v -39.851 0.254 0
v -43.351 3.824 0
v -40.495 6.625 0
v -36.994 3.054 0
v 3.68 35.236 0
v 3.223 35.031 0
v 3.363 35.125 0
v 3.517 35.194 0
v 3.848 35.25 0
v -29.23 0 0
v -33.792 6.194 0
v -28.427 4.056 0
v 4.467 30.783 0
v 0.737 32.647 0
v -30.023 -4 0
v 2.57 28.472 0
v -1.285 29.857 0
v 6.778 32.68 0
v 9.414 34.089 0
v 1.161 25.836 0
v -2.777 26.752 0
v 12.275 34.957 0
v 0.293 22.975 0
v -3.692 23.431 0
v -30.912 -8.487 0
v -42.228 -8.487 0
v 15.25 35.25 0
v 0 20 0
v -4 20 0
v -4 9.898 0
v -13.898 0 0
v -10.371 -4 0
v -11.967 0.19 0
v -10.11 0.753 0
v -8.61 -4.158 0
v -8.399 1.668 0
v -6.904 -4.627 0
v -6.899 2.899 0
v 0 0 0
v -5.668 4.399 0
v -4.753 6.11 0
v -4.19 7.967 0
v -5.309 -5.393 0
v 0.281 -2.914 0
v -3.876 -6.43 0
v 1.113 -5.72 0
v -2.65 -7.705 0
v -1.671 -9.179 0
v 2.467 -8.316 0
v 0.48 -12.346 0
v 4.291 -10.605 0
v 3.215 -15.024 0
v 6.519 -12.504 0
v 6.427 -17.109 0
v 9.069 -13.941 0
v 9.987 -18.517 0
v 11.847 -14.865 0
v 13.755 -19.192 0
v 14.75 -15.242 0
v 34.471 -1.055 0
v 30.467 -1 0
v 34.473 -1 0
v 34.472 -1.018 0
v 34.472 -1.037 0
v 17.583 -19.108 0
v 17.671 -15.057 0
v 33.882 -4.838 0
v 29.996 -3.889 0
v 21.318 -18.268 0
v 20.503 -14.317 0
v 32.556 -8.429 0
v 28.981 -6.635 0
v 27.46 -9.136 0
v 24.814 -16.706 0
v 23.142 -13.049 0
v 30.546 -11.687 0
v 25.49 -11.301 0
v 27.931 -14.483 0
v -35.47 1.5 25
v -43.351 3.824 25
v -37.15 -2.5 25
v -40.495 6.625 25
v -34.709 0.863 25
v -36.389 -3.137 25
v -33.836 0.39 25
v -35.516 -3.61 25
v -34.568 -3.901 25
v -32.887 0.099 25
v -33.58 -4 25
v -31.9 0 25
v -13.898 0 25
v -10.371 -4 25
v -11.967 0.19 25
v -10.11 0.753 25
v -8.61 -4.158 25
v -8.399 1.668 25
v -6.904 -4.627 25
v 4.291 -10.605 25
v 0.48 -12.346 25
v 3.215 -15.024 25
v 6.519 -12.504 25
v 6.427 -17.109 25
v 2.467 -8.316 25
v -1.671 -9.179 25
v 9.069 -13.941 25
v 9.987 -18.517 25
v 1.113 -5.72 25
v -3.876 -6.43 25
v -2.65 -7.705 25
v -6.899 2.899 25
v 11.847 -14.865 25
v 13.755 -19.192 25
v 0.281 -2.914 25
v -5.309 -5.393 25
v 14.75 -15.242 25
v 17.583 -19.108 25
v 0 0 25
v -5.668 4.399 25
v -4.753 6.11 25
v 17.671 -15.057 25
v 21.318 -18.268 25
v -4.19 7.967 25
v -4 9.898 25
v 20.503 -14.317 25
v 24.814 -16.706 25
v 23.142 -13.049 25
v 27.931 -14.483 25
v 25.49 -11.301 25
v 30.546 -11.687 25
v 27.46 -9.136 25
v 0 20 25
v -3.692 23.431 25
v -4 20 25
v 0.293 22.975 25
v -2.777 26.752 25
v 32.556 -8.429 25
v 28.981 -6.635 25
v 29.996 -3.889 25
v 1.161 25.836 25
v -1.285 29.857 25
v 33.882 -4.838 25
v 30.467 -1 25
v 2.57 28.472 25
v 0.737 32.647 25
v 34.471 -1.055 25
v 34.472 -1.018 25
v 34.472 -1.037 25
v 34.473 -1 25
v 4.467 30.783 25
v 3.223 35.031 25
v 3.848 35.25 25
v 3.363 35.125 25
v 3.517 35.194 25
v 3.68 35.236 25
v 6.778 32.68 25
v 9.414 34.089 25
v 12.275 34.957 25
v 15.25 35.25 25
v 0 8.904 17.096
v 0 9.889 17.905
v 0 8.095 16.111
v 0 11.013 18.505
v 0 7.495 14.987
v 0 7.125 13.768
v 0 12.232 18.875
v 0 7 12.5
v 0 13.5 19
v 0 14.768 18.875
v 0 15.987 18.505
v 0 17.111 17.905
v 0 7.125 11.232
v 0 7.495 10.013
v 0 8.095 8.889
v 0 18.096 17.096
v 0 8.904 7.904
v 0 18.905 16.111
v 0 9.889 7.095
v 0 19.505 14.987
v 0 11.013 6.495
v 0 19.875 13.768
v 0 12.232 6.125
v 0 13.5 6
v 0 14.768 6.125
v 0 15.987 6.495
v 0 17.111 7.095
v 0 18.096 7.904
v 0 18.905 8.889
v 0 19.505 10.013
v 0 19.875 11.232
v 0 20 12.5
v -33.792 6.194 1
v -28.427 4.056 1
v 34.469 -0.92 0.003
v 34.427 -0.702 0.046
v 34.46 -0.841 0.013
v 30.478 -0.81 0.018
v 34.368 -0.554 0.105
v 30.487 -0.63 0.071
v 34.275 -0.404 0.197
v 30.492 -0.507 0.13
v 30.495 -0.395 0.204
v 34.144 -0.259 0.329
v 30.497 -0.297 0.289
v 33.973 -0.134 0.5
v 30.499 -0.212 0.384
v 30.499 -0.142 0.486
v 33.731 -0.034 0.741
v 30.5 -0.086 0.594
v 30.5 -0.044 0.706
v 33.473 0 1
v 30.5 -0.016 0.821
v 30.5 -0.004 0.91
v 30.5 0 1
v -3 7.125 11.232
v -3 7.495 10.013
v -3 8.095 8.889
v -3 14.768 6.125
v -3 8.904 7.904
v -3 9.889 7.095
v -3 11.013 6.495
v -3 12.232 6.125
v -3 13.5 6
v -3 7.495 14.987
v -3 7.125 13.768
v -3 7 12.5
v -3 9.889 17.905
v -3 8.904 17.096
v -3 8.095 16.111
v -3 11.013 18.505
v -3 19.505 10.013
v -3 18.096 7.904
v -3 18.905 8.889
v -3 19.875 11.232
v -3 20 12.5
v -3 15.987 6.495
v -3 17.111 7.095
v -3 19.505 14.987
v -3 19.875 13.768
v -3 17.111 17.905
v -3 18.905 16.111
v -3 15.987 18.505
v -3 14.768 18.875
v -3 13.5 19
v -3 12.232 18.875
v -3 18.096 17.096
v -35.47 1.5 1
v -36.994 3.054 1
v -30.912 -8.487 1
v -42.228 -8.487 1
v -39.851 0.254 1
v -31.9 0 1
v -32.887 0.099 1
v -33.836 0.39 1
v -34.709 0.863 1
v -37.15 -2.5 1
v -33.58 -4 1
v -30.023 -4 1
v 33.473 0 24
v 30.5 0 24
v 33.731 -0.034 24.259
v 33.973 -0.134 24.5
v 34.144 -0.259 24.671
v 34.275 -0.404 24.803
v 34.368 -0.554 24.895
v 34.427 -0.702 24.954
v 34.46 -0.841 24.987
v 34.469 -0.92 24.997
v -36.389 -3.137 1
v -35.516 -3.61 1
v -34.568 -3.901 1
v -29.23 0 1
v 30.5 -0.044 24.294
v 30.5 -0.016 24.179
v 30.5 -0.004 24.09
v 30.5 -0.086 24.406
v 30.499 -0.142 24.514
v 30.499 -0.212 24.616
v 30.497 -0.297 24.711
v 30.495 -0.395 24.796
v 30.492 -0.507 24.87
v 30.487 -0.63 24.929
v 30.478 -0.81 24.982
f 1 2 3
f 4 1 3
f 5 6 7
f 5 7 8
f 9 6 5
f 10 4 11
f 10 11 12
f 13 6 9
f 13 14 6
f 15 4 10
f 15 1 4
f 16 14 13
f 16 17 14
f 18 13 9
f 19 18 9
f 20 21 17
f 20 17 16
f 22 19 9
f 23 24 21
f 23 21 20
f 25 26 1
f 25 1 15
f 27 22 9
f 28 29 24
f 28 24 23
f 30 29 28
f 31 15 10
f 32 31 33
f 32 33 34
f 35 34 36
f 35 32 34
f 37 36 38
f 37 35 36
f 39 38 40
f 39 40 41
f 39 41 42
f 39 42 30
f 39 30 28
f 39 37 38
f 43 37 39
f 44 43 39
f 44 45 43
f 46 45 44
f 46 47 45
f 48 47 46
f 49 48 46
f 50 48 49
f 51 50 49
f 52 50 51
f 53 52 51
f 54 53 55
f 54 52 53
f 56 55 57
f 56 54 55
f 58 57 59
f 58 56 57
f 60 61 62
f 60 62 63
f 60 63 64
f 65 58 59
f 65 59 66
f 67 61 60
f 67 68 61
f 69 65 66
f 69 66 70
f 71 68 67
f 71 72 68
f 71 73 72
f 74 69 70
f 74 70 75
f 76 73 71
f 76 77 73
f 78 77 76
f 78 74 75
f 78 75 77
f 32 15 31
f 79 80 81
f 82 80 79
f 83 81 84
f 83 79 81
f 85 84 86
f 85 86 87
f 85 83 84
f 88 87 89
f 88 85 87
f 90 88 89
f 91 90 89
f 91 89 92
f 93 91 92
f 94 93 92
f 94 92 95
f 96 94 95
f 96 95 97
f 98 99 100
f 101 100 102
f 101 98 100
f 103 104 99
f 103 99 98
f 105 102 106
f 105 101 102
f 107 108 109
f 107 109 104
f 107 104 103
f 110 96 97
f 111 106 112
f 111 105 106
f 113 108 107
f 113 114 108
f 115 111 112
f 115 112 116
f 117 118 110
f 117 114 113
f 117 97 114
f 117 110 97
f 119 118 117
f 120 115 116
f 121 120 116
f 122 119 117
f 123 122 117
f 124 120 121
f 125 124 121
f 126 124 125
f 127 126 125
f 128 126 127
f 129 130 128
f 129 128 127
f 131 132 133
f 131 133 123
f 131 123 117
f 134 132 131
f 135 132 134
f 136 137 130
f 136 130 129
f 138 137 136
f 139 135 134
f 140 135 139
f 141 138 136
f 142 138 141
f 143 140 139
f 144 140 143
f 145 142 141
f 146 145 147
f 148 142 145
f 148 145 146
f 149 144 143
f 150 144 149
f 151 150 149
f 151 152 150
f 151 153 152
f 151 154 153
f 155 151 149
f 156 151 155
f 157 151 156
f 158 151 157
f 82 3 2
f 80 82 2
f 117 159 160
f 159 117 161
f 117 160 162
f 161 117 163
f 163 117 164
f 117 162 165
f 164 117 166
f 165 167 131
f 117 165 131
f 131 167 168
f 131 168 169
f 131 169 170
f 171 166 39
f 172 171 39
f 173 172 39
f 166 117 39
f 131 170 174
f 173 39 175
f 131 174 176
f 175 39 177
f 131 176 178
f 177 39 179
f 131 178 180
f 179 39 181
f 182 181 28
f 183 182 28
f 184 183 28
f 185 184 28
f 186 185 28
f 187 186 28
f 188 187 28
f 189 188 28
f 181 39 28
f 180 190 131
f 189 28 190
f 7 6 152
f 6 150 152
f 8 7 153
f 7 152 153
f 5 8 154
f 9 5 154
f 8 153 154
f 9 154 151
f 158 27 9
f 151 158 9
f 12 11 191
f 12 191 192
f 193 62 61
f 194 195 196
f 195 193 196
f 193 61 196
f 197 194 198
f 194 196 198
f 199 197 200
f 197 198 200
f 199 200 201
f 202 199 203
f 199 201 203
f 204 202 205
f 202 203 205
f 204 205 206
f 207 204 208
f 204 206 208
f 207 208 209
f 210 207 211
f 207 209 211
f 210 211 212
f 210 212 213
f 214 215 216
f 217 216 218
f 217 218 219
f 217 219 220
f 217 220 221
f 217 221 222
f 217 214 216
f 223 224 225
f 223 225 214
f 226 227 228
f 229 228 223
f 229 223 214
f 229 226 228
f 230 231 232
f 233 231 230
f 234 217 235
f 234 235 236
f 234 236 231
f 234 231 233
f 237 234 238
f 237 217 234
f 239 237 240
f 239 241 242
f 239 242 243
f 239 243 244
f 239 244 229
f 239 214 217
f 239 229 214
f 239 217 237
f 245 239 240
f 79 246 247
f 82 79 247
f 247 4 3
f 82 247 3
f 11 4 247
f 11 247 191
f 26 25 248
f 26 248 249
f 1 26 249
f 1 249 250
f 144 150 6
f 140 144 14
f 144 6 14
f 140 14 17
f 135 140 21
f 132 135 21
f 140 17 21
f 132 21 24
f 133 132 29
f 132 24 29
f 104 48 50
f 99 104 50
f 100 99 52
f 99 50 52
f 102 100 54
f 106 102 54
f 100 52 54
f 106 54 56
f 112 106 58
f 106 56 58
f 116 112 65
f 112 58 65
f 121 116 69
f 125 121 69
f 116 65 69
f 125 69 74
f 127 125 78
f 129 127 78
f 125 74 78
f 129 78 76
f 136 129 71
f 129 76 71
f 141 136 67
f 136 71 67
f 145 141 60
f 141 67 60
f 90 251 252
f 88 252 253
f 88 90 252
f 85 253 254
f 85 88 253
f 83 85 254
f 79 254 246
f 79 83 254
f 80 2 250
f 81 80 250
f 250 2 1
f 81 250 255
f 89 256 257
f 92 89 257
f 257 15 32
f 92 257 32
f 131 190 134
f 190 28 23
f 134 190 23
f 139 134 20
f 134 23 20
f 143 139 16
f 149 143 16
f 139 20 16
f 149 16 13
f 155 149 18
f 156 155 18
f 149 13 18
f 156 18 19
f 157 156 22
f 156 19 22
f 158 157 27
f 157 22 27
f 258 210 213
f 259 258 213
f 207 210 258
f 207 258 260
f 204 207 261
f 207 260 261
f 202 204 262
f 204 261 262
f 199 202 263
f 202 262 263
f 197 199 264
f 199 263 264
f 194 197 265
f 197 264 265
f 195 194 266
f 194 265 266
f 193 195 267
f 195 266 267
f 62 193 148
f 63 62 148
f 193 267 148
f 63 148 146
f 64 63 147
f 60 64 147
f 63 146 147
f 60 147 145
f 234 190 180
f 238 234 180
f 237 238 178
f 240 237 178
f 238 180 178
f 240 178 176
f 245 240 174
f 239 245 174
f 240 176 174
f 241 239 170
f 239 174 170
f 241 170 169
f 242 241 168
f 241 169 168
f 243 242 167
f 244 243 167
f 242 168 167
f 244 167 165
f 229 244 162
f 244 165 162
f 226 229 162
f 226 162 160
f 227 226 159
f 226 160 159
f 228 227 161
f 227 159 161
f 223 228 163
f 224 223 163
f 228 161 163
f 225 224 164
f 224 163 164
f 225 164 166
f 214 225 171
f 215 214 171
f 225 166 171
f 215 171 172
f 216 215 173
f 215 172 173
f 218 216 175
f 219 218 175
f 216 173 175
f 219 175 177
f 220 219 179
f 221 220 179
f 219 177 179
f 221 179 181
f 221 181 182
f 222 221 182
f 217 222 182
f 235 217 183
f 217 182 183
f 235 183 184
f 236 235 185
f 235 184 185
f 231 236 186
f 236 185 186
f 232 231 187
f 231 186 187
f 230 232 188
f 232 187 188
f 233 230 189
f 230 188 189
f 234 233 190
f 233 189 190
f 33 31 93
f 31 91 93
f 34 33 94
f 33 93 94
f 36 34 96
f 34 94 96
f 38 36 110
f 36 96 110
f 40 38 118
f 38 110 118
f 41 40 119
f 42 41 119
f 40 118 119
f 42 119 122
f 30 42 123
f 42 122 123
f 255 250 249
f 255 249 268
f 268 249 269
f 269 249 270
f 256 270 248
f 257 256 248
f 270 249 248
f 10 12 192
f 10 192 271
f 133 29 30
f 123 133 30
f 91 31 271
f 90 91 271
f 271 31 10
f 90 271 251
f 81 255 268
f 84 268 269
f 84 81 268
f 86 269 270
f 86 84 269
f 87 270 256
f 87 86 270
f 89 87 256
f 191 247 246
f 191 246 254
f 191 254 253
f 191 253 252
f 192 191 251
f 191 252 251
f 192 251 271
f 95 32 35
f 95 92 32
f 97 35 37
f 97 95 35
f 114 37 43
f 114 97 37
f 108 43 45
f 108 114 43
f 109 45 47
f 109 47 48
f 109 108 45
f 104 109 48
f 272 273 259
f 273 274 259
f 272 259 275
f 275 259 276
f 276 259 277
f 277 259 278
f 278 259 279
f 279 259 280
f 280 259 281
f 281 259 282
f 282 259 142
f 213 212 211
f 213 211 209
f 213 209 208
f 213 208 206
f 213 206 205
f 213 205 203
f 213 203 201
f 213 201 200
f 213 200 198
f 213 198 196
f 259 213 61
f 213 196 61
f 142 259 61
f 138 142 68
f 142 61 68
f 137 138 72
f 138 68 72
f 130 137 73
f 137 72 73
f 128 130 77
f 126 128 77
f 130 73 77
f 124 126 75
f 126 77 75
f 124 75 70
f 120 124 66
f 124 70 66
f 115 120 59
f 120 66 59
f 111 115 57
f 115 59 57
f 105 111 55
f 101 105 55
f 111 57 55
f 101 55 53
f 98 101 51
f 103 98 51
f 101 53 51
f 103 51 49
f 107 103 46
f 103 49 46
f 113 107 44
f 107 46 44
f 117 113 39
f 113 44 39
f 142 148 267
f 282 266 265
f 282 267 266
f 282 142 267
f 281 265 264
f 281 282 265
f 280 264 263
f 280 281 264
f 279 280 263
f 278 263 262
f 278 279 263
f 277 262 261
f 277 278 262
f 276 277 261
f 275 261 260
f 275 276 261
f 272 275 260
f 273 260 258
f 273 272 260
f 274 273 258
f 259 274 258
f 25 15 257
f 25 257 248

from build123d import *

# Parameters (mm, degrees)
F1_DEPTH = 25
F2_R     = 5
F3_R     = 9.898276
F4_R     = 1
F5_R     = 6.5
F6_DEPTH = 3
F8_DEPTH = 1


with BuildPart() as f1:
    # F0 (on Top) → F1 (new body)
    with BuildSketch(Plane.XY):
        with BuildLine():
            ThreePointArc((30.5, 0), (15.25, -15.25), (0, 0))
            Line((0, 0), (0, 20))
            ThreePointArc((0, 20), (4.466622, 30.783378), (15.25, 35.25))
            Line((15.25, 35.25), (3.50266, 35.25))
            ThreePointArc((3.50266, 35.25), (-2.022794, 28.497829), (-4, 20))
            Line((-4, 20), (-4, 0))
            Line((-4, 0), (-34, 0))
            Line((-34, 0), (-40.494669, 6.624704))
            Line((-40.494669, 6.624704), (-43.350991, 3.824449))
            Line((-43.350991, 3.824449), (-35.680126, -4))
            Line((-35.680126, -4), (-3.57983, -4))
            ThreePointArc((-3.57983, -4), (17.261004, -19.144669), (34.5, 0))
            Line((34.5, 0), (30.5, 0))
        make_face()
    extrude(amount=F1_DEPTH)

    # F2
    f2_edges = [f1.edges().sort_by_distance(p)[0] for p in [
        (-35.680126, -4, 12.5),
        (-34, 0, 12.5),
    ]]
    fillet(f2_edges, radius=F2_R)

    # F3
    f3_edges = [f1.edges().sort_by_distance(p)[0] for p in [
        (-3.57983, -4, 12.5),
        (-4, 0, 12.5),
    ]]
    fillet(f3_edges, radius=F3_R)

    # F4
    f4_edges = [f1.edges().sort_by_distance(p)[0] for p in [
        (34.5, 0, 12.5),
        (32.5, 0, 25),
        (32.5, 0, 0),
        (3.50266, 35.25, 12.5),
    ]]
    fillet(f4_edges, radius=F4_R)

    # F5 (on face) → F6 (cut)
    with BuildSketch(Plane.YZ):
        with Locations((13.5, 12.5)):
            Circle(F5_R)
    extrude(amount=-F6_DEPTH, mode=Mode.SUBTRACT)

    # F7 (on face) → F8 (join)
    with BuildSketch(Plane(origin=(0, 0, 0), x_dir=(1, 0, 0), z_dir=(0, 0, -1))):
        Polygon((-42.2277, 8.48738), (-39.850672, -0.254048), (-33.792032, -6.193764), (-28.426796, -4.05625), (-30.911811, 8.48738), align=None)
    extrude(amount=-F8_DEPTH)


solid = f1.part
